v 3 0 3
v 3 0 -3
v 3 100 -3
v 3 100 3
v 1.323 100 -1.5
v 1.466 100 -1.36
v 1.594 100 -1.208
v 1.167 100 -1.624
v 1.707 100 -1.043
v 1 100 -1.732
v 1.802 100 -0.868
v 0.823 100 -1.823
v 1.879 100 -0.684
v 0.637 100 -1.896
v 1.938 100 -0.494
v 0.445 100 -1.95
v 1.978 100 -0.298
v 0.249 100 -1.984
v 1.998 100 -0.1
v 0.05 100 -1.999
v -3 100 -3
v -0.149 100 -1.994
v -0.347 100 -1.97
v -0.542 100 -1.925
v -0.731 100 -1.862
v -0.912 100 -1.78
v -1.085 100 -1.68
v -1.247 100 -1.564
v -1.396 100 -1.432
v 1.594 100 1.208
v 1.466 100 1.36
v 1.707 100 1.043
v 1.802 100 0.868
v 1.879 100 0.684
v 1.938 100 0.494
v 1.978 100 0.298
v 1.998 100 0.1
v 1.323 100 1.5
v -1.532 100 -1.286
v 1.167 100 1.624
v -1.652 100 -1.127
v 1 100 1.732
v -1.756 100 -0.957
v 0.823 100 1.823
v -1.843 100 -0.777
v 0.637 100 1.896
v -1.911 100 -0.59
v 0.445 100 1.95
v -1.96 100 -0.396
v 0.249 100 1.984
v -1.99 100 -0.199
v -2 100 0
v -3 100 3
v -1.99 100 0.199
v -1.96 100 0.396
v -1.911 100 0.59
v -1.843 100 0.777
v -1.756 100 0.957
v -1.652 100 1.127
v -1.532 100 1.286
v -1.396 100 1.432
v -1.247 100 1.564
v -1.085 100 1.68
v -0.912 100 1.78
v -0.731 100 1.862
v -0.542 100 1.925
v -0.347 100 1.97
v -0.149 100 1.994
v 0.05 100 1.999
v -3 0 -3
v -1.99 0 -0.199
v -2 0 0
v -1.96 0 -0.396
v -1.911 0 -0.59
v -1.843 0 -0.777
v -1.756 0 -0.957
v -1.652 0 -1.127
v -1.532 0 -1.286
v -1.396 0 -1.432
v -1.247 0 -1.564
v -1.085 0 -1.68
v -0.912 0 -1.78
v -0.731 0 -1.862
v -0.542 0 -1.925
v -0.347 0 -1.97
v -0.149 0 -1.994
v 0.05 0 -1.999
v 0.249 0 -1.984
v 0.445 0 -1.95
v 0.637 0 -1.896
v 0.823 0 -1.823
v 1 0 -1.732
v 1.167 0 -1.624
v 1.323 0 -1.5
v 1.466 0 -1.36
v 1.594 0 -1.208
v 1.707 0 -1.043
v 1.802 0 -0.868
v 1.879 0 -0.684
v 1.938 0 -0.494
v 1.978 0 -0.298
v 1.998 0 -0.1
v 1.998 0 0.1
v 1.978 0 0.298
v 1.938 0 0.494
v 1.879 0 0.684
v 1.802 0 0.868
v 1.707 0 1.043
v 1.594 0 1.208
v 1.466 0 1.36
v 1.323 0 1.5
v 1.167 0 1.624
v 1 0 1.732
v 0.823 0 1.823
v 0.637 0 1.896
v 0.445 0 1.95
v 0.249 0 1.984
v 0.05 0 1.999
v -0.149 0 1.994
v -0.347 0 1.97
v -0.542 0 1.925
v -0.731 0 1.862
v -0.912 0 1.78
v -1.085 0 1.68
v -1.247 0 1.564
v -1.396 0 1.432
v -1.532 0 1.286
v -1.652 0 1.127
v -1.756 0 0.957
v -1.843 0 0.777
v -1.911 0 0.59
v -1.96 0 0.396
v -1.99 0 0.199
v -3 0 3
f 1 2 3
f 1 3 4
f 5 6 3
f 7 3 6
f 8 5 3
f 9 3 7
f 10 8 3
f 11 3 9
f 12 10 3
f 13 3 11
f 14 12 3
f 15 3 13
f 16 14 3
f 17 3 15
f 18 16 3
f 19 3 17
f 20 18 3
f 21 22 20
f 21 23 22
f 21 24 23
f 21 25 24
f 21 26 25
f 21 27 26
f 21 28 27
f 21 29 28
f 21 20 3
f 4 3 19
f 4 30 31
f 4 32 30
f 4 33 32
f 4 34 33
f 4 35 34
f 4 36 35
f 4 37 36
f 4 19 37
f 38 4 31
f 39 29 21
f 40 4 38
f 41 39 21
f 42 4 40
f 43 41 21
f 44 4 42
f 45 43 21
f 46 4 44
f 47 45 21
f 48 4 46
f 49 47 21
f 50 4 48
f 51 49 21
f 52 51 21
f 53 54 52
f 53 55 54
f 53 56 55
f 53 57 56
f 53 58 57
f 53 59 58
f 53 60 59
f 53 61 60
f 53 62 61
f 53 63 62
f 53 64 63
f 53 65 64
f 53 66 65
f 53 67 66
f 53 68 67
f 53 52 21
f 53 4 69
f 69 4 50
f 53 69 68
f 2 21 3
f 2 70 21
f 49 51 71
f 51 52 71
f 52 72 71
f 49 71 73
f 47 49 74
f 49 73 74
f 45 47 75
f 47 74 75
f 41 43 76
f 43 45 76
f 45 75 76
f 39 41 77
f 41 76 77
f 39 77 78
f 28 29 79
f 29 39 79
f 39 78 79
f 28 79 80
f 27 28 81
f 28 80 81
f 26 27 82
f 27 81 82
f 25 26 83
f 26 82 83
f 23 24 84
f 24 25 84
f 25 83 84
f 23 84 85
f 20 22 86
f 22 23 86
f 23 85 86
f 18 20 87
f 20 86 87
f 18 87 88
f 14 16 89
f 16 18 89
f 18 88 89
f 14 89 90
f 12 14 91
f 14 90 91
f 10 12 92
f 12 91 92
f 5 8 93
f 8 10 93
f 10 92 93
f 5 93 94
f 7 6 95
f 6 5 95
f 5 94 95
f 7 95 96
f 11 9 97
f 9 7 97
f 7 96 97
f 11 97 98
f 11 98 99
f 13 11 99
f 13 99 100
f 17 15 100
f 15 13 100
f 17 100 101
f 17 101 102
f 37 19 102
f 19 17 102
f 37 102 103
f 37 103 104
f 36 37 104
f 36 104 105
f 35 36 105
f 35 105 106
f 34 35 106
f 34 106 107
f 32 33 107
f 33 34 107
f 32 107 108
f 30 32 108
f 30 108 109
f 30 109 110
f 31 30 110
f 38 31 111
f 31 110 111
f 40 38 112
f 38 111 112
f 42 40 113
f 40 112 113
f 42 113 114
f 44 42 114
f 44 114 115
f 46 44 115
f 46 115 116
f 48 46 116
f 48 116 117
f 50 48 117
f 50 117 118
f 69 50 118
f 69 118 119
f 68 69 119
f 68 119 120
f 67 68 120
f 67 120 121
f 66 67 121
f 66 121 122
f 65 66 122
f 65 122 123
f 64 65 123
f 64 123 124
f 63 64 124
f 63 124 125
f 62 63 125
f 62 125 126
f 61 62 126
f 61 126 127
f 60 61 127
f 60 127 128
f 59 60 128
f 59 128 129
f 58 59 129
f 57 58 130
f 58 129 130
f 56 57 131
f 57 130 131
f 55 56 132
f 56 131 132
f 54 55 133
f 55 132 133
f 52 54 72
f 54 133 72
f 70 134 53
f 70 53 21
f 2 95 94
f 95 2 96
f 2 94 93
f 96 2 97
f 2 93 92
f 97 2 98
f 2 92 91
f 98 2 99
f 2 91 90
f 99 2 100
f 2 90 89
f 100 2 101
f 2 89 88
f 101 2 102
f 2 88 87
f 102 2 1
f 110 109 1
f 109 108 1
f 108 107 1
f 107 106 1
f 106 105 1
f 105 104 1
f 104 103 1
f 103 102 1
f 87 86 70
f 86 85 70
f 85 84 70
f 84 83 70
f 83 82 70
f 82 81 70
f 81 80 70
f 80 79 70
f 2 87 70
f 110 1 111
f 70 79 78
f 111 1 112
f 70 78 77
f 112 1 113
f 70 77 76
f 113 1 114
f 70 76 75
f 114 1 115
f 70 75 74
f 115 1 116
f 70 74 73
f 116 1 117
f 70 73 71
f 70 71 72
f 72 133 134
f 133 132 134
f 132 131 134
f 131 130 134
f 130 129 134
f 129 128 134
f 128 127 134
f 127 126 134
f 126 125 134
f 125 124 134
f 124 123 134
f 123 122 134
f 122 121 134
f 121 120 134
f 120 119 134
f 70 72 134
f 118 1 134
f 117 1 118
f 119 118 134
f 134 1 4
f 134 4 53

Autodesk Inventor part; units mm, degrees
ref_plane "YZ Plane" through (0, 0, 0) normal (1, 0, 0) x (0, 1, 0)
ref_plane "XZ Plane" through (0, 0, 0) normal (0, 1, 0) x (-1, 0, 0)
ref_plane "XY Plane" through (0, 0, 0) normal (0, 0, 1) x (1, 0, 0)
sketch "Sketch1" plane through (0, 0, 0) normal (0, 1, 0) x (-1, 0, 0)
  line L0 (3, 3) -> (3, -3)
  line L1 (3, -3) -> (-3, -3)
  line L2 (-3, -3) -> (-3, 3)
  line L3 (-3, 3) -> (3, 3)
  line L4 (3, 3) -> (-3, -3) construction
  line L5 (3, -3) -> (-3, 3) construction
  circle A0 centre (0, 0) radius 2
  dimension "d0" = 6
  dimension "d1" = 6
  dimension "d2" = 4
extrude "Extrusion1" add sketch "Sketch1" along normal blind 100
ref_plane "Work Plane1" through (0, 0, 3) normal (1, 0, 0) x (0, 0, -1)
properties part number "carbon_fiber_6"
